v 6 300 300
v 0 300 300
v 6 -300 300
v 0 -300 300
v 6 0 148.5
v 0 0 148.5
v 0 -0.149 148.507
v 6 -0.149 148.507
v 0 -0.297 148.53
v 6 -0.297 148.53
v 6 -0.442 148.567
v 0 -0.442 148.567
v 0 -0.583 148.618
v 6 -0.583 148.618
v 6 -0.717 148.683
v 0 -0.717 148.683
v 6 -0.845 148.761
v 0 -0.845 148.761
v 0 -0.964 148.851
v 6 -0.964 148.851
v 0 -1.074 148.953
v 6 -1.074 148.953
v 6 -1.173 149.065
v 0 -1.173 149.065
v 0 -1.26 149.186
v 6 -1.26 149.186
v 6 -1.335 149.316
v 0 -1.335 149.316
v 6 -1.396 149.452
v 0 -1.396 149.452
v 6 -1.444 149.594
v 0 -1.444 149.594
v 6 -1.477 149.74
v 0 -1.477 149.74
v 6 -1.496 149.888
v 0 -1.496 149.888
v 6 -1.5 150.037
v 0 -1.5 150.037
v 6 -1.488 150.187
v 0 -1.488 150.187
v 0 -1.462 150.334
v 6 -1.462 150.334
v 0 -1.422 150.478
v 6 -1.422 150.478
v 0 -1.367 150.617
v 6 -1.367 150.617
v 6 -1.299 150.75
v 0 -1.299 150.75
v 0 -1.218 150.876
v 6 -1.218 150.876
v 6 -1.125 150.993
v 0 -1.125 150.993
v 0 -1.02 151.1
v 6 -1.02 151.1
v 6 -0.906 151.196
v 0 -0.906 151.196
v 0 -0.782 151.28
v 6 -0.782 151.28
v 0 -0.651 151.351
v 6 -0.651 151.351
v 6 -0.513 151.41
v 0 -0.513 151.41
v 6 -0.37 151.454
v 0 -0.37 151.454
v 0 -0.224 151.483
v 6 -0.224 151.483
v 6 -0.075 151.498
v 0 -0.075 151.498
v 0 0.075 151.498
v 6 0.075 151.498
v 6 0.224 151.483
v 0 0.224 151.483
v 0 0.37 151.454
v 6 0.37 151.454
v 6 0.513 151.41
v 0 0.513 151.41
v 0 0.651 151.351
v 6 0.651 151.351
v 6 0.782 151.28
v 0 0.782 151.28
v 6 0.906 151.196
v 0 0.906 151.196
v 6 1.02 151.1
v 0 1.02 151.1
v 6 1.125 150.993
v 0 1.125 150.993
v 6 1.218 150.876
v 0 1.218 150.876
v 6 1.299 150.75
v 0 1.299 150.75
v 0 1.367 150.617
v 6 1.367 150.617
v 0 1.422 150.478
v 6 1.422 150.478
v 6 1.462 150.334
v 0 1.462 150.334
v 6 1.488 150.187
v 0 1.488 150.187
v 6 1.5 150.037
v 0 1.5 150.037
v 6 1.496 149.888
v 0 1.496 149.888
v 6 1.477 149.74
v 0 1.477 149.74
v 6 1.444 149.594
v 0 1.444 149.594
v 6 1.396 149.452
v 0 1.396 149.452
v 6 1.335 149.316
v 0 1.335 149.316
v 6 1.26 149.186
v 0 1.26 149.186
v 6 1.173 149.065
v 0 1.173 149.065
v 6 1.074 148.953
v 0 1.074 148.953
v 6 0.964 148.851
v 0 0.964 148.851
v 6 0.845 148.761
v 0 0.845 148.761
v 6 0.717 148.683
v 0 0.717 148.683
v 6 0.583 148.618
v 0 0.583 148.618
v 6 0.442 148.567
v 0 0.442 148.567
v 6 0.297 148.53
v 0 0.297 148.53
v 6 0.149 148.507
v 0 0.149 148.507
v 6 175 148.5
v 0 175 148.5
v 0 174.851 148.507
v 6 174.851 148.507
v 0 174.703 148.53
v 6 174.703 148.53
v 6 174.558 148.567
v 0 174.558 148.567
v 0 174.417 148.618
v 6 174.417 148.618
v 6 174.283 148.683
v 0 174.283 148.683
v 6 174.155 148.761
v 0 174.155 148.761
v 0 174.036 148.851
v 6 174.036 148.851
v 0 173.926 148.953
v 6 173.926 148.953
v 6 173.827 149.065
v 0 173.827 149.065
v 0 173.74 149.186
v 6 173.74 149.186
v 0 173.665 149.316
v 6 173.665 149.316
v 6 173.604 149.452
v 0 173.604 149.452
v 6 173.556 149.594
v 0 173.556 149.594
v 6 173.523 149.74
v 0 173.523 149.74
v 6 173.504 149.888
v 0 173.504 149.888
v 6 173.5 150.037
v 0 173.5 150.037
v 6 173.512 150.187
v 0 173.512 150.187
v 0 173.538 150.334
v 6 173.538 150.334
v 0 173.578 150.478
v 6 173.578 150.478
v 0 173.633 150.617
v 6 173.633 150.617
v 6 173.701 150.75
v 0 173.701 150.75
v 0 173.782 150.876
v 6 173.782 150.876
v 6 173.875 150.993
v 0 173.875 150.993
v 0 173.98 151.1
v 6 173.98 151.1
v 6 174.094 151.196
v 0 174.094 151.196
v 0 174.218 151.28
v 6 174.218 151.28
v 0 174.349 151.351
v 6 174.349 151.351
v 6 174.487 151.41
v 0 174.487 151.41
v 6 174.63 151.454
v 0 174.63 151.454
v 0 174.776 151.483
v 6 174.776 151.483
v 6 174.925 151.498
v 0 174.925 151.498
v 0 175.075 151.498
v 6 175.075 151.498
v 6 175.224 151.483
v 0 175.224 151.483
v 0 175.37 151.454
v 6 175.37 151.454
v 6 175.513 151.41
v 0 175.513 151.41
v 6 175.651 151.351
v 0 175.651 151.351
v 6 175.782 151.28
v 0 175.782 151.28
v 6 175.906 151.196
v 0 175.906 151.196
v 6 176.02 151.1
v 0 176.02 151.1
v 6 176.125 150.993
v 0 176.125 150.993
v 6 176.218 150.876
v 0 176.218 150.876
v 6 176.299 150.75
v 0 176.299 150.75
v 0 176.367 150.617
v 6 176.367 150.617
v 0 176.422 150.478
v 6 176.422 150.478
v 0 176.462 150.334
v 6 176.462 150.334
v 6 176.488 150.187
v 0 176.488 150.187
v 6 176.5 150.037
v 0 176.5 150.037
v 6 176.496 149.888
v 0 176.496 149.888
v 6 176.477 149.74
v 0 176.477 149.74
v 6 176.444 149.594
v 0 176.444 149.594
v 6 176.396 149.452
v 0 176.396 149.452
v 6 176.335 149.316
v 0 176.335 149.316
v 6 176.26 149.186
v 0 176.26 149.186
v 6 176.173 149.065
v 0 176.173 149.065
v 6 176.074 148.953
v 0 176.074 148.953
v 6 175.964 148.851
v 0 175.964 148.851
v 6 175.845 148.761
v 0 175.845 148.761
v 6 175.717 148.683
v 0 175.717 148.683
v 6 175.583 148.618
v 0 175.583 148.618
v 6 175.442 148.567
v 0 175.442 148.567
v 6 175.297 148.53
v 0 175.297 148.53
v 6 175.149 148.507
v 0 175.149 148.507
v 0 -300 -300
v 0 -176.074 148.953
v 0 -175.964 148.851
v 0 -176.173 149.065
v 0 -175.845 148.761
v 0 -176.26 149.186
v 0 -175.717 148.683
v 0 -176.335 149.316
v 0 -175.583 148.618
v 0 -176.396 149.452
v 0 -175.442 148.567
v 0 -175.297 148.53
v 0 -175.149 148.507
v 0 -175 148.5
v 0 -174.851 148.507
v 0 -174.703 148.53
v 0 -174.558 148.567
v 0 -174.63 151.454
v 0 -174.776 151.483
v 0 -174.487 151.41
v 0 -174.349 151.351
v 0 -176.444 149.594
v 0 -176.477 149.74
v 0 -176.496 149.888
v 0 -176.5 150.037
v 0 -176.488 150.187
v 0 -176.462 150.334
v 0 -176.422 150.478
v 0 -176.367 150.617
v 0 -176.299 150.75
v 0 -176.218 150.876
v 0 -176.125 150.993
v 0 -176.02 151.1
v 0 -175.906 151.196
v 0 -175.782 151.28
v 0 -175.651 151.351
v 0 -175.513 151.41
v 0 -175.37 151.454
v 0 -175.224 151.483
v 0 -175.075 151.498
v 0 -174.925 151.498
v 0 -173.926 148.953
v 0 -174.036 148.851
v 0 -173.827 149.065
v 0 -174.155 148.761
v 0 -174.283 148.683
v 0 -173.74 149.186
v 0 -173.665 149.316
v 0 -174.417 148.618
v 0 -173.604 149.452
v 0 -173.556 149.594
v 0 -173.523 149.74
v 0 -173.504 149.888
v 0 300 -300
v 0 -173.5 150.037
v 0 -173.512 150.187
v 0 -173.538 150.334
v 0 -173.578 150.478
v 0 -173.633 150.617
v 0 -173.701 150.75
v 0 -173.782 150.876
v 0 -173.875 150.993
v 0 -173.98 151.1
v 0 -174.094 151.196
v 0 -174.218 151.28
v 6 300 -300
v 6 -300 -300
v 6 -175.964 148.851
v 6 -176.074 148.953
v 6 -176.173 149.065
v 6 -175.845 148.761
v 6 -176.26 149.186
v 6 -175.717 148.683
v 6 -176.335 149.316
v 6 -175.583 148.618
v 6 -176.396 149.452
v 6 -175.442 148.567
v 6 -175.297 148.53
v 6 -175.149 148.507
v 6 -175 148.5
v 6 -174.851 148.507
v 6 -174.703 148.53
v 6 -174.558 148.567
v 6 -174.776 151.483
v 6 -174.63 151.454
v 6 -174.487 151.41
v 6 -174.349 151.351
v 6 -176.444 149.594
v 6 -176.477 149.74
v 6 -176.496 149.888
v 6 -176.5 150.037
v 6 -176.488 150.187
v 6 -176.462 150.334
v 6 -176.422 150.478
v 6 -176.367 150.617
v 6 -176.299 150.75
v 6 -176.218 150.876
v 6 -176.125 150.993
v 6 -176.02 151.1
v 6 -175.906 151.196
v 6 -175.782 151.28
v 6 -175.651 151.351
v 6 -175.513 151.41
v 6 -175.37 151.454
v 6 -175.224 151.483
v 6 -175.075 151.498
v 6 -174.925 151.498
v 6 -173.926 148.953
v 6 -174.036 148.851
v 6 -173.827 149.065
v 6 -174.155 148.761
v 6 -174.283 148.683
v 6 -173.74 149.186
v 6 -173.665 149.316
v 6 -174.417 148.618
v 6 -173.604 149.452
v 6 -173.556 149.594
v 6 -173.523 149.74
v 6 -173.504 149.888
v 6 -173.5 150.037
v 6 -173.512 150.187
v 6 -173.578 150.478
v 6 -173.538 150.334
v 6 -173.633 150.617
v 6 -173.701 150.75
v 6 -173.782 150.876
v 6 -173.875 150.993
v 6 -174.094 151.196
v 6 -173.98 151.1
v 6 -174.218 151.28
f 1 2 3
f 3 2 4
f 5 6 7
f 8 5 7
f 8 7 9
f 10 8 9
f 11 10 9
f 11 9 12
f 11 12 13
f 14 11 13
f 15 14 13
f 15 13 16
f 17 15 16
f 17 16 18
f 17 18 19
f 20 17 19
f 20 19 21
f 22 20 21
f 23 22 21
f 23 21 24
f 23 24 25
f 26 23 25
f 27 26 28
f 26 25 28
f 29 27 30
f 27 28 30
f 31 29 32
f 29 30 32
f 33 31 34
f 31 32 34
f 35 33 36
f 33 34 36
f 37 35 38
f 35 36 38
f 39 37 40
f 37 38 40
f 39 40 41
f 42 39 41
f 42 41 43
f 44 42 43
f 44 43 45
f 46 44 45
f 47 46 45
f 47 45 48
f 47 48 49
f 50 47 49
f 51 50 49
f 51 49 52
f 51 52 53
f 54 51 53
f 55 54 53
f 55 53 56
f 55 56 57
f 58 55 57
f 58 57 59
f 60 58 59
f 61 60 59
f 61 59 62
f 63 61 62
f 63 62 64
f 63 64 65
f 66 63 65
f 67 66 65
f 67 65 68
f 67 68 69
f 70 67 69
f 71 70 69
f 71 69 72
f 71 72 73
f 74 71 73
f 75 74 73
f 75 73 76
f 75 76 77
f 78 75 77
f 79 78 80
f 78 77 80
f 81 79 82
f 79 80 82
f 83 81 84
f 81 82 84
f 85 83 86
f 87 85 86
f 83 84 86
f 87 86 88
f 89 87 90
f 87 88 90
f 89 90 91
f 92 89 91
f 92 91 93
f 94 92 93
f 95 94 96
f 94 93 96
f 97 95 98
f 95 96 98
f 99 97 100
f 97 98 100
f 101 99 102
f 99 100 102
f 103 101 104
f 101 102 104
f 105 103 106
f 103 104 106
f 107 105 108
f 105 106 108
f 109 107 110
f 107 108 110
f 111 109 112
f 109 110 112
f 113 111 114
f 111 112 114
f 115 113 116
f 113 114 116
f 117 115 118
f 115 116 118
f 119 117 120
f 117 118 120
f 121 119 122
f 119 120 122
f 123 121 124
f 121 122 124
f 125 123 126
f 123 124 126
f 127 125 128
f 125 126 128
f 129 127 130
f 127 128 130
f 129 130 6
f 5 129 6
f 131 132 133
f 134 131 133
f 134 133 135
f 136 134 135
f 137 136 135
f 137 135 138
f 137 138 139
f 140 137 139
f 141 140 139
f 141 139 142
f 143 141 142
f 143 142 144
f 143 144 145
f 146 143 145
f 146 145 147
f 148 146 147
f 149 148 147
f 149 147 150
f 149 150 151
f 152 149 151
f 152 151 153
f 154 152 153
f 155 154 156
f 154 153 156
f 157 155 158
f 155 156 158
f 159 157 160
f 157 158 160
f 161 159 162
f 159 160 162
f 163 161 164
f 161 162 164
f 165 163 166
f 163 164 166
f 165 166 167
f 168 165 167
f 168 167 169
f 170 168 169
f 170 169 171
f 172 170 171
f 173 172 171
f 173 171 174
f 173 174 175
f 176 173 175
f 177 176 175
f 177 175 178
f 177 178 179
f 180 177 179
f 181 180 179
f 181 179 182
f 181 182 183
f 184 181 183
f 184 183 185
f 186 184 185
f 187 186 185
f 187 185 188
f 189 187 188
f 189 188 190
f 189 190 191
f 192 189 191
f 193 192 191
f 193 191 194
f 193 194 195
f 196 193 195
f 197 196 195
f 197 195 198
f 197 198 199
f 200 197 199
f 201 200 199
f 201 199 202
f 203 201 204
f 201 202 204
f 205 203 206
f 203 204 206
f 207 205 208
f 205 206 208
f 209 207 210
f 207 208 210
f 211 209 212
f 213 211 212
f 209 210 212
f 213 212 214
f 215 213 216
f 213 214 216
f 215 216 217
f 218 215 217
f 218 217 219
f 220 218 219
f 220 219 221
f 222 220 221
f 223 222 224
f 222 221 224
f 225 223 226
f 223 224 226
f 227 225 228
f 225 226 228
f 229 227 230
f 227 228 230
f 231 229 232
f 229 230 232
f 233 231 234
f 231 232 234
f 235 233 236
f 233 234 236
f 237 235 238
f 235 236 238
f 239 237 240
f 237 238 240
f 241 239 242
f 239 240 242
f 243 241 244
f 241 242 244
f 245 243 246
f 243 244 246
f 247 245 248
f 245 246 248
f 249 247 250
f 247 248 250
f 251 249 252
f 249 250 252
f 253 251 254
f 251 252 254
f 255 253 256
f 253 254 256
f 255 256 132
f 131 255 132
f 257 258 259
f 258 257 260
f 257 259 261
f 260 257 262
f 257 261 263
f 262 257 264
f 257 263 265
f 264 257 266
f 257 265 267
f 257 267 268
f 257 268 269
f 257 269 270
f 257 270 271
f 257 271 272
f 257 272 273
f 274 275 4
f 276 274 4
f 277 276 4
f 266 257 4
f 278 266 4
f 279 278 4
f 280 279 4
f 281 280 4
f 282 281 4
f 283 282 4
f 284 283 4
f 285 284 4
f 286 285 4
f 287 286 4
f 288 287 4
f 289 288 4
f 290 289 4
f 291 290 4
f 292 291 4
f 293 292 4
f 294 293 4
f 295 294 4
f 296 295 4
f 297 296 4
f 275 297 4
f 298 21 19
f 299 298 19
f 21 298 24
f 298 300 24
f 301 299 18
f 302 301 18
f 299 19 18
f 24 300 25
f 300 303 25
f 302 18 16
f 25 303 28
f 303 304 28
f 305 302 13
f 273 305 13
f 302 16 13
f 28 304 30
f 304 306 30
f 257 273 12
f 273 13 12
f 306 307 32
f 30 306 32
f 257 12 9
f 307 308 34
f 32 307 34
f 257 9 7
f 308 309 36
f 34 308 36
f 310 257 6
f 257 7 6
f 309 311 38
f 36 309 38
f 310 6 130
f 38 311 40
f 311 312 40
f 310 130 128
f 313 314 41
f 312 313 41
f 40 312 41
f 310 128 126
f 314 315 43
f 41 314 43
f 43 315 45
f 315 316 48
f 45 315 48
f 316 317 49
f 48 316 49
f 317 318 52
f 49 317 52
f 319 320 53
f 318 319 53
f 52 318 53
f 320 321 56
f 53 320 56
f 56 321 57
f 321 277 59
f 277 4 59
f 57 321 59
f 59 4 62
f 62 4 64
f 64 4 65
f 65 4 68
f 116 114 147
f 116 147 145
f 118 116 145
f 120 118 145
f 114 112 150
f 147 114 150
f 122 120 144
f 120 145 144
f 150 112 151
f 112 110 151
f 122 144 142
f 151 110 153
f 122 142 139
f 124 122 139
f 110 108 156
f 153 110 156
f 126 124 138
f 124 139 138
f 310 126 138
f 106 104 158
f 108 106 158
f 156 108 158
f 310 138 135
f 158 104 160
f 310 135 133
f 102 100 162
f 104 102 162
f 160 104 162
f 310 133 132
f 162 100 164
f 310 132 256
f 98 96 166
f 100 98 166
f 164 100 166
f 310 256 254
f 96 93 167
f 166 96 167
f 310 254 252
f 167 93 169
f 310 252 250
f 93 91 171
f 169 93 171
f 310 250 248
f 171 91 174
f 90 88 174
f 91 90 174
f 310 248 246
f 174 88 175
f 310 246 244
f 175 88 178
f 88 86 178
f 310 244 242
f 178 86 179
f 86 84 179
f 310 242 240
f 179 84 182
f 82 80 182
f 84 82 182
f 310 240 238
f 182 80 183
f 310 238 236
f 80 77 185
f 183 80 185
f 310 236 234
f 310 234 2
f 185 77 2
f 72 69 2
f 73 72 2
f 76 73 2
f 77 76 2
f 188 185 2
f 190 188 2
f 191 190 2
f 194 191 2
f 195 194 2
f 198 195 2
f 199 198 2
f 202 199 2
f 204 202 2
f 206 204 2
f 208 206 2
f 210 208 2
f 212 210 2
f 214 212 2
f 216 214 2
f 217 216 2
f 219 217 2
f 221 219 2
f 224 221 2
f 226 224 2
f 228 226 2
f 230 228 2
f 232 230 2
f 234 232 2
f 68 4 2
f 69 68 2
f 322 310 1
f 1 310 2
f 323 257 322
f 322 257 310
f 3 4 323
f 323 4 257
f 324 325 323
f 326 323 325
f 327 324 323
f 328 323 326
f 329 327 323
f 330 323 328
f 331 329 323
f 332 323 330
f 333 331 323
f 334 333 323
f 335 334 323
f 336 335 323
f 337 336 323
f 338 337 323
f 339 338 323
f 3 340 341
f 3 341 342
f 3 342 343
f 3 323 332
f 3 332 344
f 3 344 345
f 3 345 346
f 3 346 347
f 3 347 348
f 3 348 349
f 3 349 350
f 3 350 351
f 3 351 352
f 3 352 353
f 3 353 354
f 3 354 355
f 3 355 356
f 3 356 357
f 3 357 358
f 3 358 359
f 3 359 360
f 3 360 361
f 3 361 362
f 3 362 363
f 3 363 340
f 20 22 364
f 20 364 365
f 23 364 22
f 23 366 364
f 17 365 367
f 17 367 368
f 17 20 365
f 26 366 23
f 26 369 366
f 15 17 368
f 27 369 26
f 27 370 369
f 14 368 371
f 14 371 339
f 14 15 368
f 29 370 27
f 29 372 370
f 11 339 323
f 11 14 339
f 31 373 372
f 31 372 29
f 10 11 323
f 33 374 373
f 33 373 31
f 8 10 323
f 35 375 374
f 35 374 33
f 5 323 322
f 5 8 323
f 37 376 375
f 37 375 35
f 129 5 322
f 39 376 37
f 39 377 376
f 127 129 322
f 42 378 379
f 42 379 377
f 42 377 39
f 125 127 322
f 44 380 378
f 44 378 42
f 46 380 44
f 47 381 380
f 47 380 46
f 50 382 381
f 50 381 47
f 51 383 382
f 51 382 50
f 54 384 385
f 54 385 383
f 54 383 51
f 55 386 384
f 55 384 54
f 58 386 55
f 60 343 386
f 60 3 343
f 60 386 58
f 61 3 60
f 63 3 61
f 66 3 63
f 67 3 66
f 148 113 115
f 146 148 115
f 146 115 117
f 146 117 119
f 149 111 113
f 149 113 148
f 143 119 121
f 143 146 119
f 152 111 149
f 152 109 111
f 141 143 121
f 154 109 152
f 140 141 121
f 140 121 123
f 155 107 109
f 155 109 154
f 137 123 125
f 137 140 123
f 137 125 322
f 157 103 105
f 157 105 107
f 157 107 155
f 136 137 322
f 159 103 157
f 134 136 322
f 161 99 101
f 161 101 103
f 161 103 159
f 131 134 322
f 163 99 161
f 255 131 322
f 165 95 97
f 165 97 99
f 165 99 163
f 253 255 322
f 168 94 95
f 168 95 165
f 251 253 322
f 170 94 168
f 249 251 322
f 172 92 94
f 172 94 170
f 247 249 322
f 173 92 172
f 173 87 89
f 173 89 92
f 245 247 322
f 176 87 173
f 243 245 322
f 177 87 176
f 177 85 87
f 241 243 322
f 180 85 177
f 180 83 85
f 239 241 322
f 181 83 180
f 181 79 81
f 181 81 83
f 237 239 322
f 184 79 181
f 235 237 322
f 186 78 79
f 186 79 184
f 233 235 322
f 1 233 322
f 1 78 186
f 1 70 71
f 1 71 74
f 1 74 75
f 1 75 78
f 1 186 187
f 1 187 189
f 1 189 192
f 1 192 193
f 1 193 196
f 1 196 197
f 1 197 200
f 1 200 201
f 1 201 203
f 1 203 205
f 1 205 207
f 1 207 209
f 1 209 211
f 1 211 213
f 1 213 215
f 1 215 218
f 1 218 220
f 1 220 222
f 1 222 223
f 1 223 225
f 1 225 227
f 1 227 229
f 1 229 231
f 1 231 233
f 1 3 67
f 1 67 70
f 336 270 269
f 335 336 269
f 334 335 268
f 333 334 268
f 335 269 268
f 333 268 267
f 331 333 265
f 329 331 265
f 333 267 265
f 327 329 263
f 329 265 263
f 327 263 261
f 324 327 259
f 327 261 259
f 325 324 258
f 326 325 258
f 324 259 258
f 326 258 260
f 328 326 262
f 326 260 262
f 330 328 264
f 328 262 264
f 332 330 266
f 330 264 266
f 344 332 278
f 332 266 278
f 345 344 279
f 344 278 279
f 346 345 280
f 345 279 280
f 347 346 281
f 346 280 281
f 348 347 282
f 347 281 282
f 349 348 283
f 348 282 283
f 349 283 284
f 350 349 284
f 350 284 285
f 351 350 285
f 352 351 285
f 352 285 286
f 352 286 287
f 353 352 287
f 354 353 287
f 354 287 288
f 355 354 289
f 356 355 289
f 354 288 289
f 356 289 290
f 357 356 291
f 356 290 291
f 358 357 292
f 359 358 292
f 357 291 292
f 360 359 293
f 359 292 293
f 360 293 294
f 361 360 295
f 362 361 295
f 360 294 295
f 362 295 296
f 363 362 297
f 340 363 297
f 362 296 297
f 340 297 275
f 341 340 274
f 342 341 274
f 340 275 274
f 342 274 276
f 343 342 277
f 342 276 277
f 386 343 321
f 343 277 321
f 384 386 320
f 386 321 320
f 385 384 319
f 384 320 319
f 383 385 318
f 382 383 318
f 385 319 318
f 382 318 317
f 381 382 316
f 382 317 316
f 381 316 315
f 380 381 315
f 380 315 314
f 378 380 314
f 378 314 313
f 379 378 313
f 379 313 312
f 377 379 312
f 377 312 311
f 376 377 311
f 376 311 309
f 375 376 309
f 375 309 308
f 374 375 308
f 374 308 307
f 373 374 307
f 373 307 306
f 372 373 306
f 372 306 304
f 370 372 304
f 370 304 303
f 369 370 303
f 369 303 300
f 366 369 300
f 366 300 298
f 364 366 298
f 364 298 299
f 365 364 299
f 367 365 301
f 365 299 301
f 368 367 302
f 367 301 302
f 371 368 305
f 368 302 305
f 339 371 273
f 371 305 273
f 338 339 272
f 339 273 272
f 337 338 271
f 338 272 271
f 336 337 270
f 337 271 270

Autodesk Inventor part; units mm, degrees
ref_plane "YZ Plane" through (0, 0, 0) normal (1, 0, 0) x (0, 1, 0)
ref_plane "XZ Plane" through (0, 0, 0) normal (0, 1, 0) x (-1, 0, 0)
ref_plane "XY Plane" through (0, 0, 0) normal (0, 0, 1) x (1, 0, 0)
sketch "Sketch2" plane through (0, 0, 0) normal (1, 0, 0) x (0, 1, 0)
  line L0 (-300, -300) -> (300, -300)
  line L1 (300, -300) -> (300, 300)
  line L2 (300, 300) -> (-300, 300)
  line L3 (-300, 300) -> (-300, -300)
  line L4 (-300, -300) -> (300, 300) construction
  line L5 (300, -300) -> (-300, 300) construction
  point P0 (0, 0)
  dimension "d0" = 600
  dimension "d1" = 600
extrude "Extrusion1" add sketch "Sketch2" along normal blind 6
sketch "Sketch3" plane through (6, 0, 0) normal (1, 0, 0) x (0, 0, -1)
  line L0 (-150, -175) -> (-150, 175) construction
  line L1 (0, 0) -> (-150, 0) construction
  dimension "d4" = 350
  dimension "d5" = 150
hole "Hole1" at (6, -175, 150) at (6, 175, 150) at (6, 0, 150) direction (-1, 0, 0) diameter 3 end through all
properties part number "RT_FRM_MC_009_ElectricalBackPlate"
